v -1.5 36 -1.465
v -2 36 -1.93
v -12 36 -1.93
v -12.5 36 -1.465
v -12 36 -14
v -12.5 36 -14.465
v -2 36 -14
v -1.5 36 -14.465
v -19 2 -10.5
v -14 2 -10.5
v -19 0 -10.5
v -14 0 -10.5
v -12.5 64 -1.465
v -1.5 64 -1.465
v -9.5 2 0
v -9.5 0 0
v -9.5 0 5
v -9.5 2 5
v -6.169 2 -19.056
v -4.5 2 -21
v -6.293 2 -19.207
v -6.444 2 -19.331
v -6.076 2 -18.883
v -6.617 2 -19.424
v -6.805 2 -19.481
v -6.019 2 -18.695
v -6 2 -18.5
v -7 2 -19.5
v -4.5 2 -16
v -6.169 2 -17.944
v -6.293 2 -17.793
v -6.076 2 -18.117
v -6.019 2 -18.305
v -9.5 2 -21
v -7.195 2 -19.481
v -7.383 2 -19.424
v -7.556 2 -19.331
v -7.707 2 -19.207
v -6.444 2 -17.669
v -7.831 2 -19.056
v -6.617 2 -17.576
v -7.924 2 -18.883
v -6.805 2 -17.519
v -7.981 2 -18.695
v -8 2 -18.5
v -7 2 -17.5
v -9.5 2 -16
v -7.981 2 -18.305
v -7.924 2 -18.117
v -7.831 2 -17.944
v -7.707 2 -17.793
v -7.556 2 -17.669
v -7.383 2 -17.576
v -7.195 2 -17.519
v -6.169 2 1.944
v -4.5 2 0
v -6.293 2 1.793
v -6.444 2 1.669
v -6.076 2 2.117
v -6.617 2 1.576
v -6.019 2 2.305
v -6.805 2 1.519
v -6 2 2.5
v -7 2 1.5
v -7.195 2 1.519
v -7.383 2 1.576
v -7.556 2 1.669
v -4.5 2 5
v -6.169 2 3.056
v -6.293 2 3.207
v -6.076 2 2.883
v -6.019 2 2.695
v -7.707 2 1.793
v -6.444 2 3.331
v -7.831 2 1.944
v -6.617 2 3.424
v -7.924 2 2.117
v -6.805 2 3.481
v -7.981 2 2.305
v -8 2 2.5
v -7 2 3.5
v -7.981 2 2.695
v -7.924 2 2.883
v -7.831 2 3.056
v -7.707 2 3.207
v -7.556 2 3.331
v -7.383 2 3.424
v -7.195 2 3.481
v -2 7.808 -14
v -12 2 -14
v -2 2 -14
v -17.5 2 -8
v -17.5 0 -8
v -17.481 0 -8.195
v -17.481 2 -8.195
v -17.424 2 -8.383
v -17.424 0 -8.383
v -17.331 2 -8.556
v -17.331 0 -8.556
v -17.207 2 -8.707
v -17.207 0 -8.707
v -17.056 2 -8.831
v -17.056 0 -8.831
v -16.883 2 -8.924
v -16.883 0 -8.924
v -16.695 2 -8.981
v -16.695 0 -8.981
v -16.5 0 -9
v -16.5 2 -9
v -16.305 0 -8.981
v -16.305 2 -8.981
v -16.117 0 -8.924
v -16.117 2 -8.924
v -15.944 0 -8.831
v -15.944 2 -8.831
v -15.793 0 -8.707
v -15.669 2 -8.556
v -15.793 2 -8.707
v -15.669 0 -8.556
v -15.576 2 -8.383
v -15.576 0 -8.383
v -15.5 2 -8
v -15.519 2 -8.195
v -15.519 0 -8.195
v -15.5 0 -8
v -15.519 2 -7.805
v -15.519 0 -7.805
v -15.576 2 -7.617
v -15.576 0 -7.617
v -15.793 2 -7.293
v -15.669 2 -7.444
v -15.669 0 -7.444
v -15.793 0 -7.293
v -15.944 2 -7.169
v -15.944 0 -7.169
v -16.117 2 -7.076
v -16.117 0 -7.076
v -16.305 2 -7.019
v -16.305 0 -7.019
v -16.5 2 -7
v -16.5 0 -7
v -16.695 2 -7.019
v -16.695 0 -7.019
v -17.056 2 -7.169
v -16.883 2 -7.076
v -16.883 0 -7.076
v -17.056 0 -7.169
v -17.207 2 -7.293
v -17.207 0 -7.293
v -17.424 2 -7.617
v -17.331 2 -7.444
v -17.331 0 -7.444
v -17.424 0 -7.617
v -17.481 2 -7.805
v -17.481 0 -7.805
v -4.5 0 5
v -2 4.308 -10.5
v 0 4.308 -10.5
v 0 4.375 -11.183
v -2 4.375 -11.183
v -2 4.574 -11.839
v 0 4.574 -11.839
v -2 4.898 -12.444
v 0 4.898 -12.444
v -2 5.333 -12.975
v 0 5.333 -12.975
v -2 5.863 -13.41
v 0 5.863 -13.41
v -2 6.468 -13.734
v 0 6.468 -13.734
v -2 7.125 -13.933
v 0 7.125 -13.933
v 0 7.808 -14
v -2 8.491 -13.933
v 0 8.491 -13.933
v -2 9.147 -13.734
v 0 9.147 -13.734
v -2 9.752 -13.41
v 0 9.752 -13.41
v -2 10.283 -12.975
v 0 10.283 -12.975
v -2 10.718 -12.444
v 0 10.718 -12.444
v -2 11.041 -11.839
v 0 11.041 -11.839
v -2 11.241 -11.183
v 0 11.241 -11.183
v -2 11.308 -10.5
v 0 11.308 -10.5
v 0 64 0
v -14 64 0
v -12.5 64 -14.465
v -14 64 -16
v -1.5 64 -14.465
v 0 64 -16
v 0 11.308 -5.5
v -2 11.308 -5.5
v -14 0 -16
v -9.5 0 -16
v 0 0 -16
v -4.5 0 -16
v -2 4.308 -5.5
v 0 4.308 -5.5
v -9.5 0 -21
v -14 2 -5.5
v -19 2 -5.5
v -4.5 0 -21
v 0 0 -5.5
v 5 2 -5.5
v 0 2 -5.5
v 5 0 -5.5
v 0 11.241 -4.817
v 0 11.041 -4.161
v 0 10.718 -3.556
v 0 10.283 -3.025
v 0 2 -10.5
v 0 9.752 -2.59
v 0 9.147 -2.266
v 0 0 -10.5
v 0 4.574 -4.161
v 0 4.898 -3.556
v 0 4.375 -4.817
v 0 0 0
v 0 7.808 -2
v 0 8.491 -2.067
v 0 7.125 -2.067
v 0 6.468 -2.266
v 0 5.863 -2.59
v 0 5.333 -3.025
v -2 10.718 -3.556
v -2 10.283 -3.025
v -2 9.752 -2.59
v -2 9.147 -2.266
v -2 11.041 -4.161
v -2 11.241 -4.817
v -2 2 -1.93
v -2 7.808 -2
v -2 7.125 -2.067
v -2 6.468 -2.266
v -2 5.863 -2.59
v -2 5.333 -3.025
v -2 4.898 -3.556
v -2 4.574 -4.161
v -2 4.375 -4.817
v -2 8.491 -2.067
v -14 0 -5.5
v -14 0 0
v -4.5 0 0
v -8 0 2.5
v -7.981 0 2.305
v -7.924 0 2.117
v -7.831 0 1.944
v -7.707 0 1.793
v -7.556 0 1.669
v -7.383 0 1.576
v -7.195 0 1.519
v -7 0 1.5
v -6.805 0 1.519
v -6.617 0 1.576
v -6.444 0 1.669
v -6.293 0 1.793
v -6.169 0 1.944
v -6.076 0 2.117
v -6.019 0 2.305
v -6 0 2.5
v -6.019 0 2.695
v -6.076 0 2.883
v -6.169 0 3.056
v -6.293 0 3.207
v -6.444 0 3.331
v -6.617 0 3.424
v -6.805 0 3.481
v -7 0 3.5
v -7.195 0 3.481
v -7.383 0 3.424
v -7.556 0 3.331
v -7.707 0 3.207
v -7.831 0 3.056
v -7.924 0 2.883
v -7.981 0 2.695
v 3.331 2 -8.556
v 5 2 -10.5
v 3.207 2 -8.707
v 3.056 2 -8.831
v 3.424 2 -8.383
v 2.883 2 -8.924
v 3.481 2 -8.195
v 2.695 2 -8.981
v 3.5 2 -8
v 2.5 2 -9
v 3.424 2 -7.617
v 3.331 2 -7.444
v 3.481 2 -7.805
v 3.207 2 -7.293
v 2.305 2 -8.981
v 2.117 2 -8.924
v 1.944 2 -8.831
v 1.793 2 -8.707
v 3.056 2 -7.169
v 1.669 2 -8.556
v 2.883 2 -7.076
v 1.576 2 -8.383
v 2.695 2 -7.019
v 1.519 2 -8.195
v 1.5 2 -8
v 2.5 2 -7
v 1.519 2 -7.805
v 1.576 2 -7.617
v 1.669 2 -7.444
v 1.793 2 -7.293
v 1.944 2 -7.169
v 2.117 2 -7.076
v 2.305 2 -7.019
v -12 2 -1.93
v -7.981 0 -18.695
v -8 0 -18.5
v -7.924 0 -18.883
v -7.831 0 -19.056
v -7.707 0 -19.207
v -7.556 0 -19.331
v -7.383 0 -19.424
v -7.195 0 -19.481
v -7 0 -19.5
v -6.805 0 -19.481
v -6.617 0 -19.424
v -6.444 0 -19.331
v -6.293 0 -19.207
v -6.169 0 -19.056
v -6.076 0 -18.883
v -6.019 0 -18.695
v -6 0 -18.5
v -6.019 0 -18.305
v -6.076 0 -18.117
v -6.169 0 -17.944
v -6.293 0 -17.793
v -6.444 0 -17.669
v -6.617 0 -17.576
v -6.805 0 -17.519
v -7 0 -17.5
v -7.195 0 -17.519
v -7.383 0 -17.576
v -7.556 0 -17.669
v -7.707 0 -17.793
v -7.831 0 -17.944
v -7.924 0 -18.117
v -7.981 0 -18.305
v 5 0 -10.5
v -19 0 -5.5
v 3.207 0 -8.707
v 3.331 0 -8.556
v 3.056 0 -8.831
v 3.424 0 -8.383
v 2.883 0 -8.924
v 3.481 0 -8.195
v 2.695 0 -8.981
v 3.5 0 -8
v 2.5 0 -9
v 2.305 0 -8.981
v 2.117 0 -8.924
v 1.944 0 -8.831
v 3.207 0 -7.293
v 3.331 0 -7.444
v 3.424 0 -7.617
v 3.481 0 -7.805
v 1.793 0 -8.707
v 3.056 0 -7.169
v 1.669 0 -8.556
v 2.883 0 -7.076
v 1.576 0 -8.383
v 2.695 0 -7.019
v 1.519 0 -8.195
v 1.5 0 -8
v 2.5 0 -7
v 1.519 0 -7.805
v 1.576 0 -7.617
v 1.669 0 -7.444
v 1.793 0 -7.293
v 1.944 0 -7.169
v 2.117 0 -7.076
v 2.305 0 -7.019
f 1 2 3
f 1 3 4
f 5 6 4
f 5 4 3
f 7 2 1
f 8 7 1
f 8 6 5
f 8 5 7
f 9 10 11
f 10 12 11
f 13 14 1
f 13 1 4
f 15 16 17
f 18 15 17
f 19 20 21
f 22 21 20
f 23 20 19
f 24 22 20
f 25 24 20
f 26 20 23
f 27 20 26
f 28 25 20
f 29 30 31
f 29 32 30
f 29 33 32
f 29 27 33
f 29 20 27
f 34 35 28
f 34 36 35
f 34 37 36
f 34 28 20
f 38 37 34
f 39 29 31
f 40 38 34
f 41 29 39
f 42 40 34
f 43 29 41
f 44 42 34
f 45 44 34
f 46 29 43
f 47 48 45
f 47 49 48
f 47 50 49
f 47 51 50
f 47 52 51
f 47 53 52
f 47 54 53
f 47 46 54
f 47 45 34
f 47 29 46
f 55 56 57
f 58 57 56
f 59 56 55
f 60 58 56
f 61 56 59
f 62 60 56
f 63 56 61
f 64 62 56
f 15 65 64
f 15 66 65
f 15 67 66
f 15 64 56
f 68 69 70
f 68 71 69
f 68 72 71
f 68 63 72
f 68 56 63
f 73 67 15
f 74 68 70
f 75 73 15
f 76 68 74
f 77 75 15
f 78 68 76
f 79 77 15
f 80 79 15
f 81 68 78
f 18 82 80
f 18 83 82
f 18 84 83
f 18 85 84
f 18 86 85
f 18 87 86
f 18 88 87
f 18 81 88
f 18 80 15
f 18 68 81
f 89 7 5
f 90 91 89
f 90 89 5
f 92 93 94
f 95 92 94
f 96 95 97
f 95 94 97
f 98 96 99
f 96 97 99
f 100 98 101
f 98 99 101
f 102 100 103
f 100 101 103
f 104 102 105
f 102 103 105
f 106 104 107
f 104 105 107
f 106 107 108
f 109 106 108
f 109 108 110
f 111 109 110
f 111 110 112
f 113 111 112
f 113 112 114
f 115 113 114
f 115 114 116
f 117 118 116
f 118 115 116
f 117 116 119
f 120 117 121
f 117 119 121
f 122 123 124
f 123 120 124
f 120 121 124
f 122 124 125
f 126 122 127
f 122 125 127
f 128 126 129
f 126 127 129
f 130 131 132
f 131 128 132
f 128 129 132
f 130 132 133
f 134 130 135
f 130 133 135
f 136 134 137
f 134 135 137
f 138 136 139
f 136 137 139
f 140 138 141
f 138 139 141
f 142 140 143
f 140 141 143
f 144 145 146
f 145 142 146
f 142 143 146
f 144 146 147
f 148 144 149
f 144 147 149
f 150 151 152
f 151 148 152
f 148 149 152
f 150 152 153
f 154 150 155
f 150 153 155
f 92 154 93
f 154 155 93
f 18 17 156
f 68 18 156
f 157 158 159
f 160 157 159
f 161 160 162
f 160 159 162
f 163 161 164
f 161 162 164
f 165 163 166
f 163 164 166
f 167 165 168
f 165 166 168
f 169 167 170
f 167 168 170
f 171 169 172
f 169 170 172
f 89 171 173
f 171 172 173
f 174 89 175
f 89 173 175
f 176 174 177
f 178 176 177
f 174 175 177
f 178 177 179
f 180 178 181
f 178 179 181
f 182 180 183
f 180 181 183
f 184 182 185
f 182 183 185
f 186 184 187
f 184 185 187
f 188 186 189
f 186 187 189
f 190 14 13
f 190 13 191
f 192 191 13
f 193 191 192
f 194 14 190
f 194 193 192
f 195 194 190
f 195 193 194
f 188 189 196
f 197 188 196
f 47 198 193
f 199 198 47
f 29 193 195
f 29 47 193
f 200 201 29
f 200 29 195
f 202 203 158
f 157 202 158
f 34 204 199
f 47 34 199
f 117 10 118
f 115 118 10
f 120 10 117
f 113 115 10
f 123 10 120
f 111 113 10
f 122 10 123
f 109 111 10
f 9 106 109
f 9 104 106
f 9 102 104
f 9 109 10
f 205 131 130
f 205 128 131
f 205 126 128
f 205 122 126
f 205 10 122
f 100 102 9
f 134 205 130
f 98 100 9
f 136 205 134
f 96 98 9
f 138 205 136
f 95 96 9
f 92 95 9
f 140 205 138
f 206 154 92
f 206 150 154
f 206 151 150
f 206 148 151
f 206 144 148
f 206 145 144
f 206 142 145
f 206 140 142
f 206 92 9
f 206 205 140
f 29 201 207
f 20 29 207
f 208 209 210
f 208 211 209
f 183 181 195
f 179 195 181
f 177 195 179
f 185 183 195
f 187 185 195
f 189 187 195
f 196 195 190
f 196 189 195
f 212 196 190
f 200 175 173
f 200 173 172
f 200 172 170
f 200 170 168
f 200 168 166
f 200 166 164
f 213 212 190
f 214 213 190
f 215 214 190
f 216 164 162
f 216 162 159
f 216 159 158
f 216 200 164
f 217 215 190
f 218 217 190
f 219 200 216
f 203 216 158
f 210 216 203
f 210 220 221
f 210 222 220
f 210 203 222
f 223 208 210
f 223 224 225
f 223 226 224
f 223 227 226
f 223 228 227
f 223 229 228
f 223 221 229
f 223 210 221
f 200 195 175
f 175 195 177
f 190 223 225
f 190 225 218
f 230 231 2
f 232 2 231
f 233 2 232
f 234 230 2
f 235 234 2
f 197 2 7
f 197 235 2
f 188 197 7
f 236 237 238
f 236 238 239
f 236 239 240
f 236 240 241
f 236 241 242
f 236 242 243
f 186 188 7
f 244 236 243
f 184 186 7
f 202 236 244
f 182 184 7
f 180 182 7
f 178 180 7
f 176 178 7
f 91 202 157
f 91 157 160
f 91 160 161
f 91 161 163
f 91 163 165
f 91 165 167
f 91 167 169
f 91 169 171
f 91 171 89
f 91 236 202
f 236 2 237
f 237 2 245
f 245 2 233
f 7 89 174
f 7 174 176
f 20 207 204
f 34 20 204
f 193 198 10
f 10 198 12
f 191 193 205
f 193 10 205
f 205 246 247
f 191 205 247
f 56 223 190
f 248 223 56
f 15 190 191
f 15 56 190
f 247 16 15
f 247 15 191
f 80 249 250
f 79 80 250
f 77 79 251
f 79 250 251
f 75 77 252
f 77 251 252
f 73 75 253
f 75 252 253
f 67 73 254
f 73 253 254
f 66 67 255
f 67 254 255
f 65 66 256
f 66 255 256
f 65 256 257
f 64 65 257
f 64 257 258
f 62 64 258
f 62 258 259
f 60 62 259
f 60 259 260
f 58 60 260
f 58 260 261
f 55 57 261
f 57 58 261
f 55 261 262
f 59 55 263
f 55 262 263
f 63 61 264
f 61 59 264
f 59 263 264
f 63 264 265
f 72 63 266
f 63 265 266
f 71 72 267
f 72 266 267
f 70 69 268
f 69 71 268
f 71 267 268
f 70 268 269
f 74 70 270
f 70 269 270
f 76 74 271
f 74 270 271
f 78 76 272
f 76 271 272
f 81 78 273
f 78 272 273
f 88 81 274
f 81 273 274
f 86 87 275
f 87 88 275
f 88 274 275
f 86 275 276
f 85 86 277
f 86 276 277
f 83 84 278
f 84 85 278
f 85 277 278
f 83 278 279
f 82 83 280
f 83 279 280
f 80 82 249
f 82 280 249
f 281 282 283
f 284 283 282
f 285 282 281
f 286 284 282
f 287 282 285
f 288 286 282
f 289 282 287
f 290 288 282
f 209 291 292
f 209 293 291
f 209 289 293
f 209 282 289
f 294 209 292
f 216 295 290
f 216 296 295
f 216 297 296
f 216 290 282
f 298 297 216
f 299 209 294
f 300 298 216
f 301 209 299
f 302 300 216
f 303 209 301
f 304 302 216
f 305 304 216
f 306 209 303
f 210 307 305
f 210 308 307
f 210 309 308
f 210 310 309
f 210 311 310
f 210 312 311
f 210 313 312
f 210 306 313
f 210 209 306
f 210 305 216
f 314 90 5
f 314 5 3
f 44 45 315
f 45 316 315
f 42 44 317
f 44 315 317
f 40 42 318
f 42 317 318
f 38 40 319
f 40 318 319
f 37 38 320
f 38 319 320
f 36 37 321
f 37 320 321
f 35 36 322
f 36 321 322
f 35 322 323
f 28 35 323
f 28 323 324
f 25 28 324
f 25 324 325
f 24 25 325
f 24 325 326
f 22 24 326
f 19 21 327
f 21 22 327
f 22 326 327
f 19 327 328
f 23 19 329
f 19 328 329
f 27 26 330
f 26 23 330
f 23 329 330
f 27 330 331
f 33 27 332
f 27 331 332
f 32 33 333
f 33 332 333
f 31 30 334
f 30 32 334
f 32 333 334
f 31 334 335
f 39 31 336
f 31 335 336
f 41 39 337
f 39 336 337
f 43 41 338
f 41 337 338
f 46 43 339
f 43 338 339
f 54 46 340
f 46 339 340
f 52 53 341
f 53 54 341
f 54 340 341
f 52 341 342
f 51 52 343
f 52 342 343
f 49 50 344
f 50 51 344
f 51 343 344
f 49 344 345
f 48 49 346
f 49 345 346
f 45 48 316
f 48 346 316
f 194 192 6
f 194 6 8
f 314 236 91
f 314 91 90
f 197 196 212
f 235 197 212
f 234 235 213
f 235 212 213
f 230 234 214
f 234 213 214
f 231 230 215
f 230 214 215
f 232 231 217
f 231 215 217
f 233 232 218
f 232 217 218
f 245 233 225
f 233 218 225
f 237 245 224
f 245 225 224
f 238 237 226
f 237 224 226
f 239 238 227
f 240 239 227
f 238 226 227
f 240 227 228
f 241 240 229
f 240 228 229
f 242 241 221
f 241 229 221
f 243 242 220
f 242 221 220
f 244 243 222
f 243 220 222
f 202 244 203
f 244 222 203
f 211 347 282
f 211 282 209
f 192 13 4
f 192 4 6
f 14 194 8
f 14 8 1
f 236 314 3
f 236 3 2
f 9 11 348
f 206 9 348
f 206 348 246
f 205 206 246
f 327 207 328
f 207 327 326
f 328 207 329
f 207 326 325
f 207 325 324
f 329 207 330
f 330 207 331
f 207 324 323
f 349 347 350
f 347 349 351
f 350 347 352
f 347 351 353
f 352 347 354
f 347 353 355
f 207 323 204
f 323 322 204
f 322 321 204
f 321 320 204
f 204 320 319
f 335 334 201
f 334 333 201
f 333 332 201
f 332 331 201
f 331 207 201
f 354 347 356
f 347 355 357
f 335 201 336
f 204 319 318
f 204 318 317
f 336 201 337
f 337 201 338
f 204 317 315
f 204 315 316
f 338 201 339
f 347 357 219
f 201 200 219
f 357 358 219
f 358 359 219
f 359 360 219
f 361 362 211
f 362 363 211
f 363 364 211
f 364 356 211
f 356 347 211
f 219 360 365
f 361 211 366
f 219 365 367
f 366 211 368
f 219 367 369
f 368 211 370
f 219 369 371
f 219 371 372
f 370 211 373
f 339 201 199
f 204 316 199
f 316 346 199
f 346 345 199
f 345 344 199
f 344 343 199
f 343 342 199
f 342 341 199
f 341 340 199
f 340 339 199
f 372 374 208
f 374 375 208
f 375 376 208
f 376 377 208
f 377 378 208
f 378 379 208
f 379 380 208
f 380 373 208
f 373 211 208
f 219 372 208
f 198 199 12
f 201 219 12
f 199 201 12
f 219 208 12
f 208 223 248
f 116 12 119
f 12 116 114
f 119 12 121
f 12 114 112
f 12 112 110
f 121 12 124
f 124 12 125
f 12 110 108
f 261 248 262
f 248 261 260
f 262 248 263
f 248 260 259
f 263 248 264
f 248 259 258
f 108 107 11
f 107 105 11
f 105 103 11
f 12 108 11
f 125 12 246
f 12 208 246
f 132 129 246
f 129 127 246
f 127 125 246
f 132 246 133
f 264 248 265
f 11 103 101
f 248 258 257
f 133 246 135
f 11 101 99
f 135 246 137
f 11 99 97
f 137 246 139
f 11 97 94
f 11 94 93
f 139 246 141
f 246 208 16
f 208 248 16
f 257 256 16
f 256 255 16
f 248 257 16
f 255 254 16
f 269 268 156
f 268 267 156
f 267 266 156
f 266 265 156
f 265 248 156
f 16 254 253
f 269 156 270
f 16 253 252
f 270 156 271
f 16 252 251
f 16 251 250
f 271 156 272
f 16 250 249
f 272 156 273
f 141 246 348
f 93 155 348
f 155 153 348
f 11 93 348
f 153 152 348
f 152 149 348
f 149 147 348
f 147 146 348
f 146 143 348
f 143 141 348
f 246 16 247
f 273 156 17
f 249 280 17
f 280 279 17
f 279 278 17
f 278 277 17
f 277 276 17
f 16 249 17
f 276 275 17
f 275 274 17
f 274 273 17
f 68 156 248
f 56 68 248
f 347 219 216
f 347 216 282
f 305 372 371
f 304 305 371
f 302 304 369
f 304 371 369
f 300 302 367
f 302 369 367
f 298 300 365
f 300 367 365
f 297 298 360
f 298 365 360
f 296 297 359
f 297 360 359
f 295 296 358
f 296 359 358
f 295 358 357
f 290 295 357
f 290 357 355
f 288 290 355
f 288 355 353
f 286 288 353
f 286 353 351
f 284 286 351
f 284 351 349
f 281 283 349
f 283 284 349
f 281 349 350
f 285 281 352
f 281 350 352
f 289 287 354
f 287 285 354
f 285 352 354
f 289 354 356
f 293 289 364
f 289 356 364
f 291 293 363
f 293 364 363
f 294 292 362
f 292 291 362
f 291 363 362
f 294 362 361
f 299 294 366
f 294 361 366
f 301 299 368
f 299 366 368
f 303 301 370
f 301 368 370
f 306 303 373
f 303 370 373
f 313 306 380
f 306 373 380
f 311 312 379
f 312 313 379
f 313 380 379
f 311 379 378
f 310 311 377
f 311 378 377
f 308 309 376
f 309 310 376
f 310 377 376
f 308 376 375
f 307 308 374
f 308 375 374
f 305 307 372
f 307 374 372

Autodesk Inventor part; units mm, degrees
ref_plane "YZ Plane" through (0, 0, 0) normal (1, 0, 0) x (0, 1, 0)
ref_plane "XZ Plane" through (0, 0, 0) normal (0, 1, 0) x (-1, 0, 0)
ref_plane "XY Plane" through (0, 0, 0) normal (0, 0, 1) x (1, 0, 0)
sketch "Boceto1" plane through (0, 0, 0) normal (0, 1, 0) x (-1, 0, 0)
  line L0 (0, 0) -> (14, 0)
  line L1 (14, 0) -> (14, -16)
  line L2 (14, -16) -> (0, -16)
  line L3 (0, -16) -> (0, 0)
  line L4 (12, -2) -> (2, -2)
  line L5 (2, -2) -> (2, -14)
  line L6 (2, -14) -> (12, -14)
  line L7 (12, -14) -> (12, -2)
  line L8 (12, -2) -> (2, -14) construction
  line L9 (2, -2) -> (12, -14) construction
  line L10 (14, -8) -> (14, -10.5)
  line L11 (14, -10.5) -> (19, -10.5)
  line L12 (19, -10.5) -> (19, -5.5)
  line L13 (19, -5.5) -> (14, -5.5)
  circle A0 centre (16.5, -8) radius 1
  line L14 (7, -16) -> (4.5, -16)
  line L15 (4.5, -16) -> (4.5, -21)
  line L16 (4.5, -21) -> (9.5, -21)
  line L17 (9.5, -21) -> (9.5, -16)
  circle A1 centre (7, -18.5) radius 1
  line L18 (7, 0) -> (9.5, 0)
  line L19 (9.5, 0) -> (9.5, 5)
  line L20 (9.5, 5) -> (4.5, 5)
  line L21 (4.5, 5) -> (4.5, 0)
  circle A2 centre (7, 2.5) radius 1
  line L22 (0, -8) -> (0, -10.5)
  line L23 (0, -10.5) -> (-5, -10.5)
  line L24 (-5, -10.5) -> (-5, -5.5)
  line L25 (-5, -5.5) -> (0, -5.5)
  circle A3 centre (-2.5, -8) radius 1
  point P0 (7, -8)
  dimension "d0" = 14
  dimension "d1" = 16
  dimension "d2" = 10
  dimension "d3" = 12
  dimension "d4" = 2.5
  dimension "d5" = 5
  dimension "d6" = 5
  dimension "d7" = 2
  dimension "d8" = 2.5
  dimension "d9" = 5
  dimension "d10" = 5
  dimension "d11" = 2
  dimension "d12" = 2.5
  dimension "d13" = 5
  dimension "d14" = 5
  dimension "d15" = 2
  dimension "d16" = 2.5
  dimension "d17" = 5
  dimension "d18" = 5
  dimension "d19" = 2
extrude "Extrusión1" add sketch "Boceto1" along normal blind 2
sketch "Boceto2" plane through (0, 2, 0) normal (0, 1, 0) x (1, 0, 0)
  line L0 (-9.5, 16) -> (-14, 16) projected
  line L1 (-14, 16) -> (0, 16)
  line L2 (0, 16) -> (0, 0)
  line L3 (-14, 0) -> (-9.5, 0) projected
  line L4 (0, 0) -> (-14, 0)
  line L5 (-14, 16) -> (-14, 10.5) projected
  line L6 (-14, 0) -> (-14, 16)
  line L7 (-2, 14) -> (-12, 14) projected
  line L8 (-12, 14) -> (-12, 1.9304)
  line L9 (-12, 1.9304) -> (-2, 1.9304)
  line L10 (-2, 14) -> (-2, 2) projected
  line L11 (-2, 1.9304) -> (-2, 14)
  line L12 (-2, 14) -> (-12, 14)
extrude "Extrusión2" add sketch "Boceto2" along normal blind 62
sketch "Boceto3" plane through (0, 0, -10.5) normal (1, 0, 0) x (0, 0, -1)
  line L0 (-5, 7.8078) -> (0, 7.8078) construction
  line L1 (-5, 4.3078) -> (0, 4.3078)
  line L2 (0, 11.3078) -> (-5, 11.3078)
  arc A0 (-5, 11.3078) -> (-5, 4.3078) centre (-5, 7.8078) ccw
  arc A1 (0, 4.3078) -> (0, 11.3078) centre (0, 7.8078) ccw
  line L3 (3.5, 0) -> (3.5, 64) projected
  point P0 (-10.5, 0)
  point P1 (-2.5, 7.8078)
extrude "Extrusión3" cut sketch "Boceto3" against normal blind 2
extrude "Extrusión4" add sketch "Boceto1" along normal blind 2 contours L7 L6 L5 L4
sketch "Boceto4" plane through (0, 64, 0) normal (0, 1, 0) x (1, 0, 0)
  line L0 (-12, 14) -> (-2, 14) projected
  line L1 (-12, 14) -> (-2, 14)
  line L2 (-2, 2) -> (-2, 5.5) projected
  line L3 (-2, 14) -> (-2, 2)
  line L4 (-2, 1.9304) -> (-12, 1.9304) projected
  line L5 (-2, 2) -> (-12, 1.9304)
  line L6 (-12, 1.9304) -> (-12, 14)
  line L7 (-12.5, 14.4652) -> (-1.5, 14.4652)
  line L8 (-1.5, 14.4652) -> (-1.5, 1.4652)
  line L9 (-1.5, 1.4652) -> (-12.5, 1.4652)
  line L10 (-12.5, 1.4652) -> (-12.5, 14.4652)
  line L11 (-12.5, 14.4652) -> (-1.5, 1.4652) construction
  line L12 (-1.5, 14.4652) -> (-12.5, 1.4652) construction
  point P0 (0, 0)
  point P1 (-7, 7.9652)
  dimension "d28" = 11
  dimension "d29" = 13
extrude "Extrusión5" cut sketch "Boceto4" against normal blind 28
properties part number "SoporteMotorx1"
